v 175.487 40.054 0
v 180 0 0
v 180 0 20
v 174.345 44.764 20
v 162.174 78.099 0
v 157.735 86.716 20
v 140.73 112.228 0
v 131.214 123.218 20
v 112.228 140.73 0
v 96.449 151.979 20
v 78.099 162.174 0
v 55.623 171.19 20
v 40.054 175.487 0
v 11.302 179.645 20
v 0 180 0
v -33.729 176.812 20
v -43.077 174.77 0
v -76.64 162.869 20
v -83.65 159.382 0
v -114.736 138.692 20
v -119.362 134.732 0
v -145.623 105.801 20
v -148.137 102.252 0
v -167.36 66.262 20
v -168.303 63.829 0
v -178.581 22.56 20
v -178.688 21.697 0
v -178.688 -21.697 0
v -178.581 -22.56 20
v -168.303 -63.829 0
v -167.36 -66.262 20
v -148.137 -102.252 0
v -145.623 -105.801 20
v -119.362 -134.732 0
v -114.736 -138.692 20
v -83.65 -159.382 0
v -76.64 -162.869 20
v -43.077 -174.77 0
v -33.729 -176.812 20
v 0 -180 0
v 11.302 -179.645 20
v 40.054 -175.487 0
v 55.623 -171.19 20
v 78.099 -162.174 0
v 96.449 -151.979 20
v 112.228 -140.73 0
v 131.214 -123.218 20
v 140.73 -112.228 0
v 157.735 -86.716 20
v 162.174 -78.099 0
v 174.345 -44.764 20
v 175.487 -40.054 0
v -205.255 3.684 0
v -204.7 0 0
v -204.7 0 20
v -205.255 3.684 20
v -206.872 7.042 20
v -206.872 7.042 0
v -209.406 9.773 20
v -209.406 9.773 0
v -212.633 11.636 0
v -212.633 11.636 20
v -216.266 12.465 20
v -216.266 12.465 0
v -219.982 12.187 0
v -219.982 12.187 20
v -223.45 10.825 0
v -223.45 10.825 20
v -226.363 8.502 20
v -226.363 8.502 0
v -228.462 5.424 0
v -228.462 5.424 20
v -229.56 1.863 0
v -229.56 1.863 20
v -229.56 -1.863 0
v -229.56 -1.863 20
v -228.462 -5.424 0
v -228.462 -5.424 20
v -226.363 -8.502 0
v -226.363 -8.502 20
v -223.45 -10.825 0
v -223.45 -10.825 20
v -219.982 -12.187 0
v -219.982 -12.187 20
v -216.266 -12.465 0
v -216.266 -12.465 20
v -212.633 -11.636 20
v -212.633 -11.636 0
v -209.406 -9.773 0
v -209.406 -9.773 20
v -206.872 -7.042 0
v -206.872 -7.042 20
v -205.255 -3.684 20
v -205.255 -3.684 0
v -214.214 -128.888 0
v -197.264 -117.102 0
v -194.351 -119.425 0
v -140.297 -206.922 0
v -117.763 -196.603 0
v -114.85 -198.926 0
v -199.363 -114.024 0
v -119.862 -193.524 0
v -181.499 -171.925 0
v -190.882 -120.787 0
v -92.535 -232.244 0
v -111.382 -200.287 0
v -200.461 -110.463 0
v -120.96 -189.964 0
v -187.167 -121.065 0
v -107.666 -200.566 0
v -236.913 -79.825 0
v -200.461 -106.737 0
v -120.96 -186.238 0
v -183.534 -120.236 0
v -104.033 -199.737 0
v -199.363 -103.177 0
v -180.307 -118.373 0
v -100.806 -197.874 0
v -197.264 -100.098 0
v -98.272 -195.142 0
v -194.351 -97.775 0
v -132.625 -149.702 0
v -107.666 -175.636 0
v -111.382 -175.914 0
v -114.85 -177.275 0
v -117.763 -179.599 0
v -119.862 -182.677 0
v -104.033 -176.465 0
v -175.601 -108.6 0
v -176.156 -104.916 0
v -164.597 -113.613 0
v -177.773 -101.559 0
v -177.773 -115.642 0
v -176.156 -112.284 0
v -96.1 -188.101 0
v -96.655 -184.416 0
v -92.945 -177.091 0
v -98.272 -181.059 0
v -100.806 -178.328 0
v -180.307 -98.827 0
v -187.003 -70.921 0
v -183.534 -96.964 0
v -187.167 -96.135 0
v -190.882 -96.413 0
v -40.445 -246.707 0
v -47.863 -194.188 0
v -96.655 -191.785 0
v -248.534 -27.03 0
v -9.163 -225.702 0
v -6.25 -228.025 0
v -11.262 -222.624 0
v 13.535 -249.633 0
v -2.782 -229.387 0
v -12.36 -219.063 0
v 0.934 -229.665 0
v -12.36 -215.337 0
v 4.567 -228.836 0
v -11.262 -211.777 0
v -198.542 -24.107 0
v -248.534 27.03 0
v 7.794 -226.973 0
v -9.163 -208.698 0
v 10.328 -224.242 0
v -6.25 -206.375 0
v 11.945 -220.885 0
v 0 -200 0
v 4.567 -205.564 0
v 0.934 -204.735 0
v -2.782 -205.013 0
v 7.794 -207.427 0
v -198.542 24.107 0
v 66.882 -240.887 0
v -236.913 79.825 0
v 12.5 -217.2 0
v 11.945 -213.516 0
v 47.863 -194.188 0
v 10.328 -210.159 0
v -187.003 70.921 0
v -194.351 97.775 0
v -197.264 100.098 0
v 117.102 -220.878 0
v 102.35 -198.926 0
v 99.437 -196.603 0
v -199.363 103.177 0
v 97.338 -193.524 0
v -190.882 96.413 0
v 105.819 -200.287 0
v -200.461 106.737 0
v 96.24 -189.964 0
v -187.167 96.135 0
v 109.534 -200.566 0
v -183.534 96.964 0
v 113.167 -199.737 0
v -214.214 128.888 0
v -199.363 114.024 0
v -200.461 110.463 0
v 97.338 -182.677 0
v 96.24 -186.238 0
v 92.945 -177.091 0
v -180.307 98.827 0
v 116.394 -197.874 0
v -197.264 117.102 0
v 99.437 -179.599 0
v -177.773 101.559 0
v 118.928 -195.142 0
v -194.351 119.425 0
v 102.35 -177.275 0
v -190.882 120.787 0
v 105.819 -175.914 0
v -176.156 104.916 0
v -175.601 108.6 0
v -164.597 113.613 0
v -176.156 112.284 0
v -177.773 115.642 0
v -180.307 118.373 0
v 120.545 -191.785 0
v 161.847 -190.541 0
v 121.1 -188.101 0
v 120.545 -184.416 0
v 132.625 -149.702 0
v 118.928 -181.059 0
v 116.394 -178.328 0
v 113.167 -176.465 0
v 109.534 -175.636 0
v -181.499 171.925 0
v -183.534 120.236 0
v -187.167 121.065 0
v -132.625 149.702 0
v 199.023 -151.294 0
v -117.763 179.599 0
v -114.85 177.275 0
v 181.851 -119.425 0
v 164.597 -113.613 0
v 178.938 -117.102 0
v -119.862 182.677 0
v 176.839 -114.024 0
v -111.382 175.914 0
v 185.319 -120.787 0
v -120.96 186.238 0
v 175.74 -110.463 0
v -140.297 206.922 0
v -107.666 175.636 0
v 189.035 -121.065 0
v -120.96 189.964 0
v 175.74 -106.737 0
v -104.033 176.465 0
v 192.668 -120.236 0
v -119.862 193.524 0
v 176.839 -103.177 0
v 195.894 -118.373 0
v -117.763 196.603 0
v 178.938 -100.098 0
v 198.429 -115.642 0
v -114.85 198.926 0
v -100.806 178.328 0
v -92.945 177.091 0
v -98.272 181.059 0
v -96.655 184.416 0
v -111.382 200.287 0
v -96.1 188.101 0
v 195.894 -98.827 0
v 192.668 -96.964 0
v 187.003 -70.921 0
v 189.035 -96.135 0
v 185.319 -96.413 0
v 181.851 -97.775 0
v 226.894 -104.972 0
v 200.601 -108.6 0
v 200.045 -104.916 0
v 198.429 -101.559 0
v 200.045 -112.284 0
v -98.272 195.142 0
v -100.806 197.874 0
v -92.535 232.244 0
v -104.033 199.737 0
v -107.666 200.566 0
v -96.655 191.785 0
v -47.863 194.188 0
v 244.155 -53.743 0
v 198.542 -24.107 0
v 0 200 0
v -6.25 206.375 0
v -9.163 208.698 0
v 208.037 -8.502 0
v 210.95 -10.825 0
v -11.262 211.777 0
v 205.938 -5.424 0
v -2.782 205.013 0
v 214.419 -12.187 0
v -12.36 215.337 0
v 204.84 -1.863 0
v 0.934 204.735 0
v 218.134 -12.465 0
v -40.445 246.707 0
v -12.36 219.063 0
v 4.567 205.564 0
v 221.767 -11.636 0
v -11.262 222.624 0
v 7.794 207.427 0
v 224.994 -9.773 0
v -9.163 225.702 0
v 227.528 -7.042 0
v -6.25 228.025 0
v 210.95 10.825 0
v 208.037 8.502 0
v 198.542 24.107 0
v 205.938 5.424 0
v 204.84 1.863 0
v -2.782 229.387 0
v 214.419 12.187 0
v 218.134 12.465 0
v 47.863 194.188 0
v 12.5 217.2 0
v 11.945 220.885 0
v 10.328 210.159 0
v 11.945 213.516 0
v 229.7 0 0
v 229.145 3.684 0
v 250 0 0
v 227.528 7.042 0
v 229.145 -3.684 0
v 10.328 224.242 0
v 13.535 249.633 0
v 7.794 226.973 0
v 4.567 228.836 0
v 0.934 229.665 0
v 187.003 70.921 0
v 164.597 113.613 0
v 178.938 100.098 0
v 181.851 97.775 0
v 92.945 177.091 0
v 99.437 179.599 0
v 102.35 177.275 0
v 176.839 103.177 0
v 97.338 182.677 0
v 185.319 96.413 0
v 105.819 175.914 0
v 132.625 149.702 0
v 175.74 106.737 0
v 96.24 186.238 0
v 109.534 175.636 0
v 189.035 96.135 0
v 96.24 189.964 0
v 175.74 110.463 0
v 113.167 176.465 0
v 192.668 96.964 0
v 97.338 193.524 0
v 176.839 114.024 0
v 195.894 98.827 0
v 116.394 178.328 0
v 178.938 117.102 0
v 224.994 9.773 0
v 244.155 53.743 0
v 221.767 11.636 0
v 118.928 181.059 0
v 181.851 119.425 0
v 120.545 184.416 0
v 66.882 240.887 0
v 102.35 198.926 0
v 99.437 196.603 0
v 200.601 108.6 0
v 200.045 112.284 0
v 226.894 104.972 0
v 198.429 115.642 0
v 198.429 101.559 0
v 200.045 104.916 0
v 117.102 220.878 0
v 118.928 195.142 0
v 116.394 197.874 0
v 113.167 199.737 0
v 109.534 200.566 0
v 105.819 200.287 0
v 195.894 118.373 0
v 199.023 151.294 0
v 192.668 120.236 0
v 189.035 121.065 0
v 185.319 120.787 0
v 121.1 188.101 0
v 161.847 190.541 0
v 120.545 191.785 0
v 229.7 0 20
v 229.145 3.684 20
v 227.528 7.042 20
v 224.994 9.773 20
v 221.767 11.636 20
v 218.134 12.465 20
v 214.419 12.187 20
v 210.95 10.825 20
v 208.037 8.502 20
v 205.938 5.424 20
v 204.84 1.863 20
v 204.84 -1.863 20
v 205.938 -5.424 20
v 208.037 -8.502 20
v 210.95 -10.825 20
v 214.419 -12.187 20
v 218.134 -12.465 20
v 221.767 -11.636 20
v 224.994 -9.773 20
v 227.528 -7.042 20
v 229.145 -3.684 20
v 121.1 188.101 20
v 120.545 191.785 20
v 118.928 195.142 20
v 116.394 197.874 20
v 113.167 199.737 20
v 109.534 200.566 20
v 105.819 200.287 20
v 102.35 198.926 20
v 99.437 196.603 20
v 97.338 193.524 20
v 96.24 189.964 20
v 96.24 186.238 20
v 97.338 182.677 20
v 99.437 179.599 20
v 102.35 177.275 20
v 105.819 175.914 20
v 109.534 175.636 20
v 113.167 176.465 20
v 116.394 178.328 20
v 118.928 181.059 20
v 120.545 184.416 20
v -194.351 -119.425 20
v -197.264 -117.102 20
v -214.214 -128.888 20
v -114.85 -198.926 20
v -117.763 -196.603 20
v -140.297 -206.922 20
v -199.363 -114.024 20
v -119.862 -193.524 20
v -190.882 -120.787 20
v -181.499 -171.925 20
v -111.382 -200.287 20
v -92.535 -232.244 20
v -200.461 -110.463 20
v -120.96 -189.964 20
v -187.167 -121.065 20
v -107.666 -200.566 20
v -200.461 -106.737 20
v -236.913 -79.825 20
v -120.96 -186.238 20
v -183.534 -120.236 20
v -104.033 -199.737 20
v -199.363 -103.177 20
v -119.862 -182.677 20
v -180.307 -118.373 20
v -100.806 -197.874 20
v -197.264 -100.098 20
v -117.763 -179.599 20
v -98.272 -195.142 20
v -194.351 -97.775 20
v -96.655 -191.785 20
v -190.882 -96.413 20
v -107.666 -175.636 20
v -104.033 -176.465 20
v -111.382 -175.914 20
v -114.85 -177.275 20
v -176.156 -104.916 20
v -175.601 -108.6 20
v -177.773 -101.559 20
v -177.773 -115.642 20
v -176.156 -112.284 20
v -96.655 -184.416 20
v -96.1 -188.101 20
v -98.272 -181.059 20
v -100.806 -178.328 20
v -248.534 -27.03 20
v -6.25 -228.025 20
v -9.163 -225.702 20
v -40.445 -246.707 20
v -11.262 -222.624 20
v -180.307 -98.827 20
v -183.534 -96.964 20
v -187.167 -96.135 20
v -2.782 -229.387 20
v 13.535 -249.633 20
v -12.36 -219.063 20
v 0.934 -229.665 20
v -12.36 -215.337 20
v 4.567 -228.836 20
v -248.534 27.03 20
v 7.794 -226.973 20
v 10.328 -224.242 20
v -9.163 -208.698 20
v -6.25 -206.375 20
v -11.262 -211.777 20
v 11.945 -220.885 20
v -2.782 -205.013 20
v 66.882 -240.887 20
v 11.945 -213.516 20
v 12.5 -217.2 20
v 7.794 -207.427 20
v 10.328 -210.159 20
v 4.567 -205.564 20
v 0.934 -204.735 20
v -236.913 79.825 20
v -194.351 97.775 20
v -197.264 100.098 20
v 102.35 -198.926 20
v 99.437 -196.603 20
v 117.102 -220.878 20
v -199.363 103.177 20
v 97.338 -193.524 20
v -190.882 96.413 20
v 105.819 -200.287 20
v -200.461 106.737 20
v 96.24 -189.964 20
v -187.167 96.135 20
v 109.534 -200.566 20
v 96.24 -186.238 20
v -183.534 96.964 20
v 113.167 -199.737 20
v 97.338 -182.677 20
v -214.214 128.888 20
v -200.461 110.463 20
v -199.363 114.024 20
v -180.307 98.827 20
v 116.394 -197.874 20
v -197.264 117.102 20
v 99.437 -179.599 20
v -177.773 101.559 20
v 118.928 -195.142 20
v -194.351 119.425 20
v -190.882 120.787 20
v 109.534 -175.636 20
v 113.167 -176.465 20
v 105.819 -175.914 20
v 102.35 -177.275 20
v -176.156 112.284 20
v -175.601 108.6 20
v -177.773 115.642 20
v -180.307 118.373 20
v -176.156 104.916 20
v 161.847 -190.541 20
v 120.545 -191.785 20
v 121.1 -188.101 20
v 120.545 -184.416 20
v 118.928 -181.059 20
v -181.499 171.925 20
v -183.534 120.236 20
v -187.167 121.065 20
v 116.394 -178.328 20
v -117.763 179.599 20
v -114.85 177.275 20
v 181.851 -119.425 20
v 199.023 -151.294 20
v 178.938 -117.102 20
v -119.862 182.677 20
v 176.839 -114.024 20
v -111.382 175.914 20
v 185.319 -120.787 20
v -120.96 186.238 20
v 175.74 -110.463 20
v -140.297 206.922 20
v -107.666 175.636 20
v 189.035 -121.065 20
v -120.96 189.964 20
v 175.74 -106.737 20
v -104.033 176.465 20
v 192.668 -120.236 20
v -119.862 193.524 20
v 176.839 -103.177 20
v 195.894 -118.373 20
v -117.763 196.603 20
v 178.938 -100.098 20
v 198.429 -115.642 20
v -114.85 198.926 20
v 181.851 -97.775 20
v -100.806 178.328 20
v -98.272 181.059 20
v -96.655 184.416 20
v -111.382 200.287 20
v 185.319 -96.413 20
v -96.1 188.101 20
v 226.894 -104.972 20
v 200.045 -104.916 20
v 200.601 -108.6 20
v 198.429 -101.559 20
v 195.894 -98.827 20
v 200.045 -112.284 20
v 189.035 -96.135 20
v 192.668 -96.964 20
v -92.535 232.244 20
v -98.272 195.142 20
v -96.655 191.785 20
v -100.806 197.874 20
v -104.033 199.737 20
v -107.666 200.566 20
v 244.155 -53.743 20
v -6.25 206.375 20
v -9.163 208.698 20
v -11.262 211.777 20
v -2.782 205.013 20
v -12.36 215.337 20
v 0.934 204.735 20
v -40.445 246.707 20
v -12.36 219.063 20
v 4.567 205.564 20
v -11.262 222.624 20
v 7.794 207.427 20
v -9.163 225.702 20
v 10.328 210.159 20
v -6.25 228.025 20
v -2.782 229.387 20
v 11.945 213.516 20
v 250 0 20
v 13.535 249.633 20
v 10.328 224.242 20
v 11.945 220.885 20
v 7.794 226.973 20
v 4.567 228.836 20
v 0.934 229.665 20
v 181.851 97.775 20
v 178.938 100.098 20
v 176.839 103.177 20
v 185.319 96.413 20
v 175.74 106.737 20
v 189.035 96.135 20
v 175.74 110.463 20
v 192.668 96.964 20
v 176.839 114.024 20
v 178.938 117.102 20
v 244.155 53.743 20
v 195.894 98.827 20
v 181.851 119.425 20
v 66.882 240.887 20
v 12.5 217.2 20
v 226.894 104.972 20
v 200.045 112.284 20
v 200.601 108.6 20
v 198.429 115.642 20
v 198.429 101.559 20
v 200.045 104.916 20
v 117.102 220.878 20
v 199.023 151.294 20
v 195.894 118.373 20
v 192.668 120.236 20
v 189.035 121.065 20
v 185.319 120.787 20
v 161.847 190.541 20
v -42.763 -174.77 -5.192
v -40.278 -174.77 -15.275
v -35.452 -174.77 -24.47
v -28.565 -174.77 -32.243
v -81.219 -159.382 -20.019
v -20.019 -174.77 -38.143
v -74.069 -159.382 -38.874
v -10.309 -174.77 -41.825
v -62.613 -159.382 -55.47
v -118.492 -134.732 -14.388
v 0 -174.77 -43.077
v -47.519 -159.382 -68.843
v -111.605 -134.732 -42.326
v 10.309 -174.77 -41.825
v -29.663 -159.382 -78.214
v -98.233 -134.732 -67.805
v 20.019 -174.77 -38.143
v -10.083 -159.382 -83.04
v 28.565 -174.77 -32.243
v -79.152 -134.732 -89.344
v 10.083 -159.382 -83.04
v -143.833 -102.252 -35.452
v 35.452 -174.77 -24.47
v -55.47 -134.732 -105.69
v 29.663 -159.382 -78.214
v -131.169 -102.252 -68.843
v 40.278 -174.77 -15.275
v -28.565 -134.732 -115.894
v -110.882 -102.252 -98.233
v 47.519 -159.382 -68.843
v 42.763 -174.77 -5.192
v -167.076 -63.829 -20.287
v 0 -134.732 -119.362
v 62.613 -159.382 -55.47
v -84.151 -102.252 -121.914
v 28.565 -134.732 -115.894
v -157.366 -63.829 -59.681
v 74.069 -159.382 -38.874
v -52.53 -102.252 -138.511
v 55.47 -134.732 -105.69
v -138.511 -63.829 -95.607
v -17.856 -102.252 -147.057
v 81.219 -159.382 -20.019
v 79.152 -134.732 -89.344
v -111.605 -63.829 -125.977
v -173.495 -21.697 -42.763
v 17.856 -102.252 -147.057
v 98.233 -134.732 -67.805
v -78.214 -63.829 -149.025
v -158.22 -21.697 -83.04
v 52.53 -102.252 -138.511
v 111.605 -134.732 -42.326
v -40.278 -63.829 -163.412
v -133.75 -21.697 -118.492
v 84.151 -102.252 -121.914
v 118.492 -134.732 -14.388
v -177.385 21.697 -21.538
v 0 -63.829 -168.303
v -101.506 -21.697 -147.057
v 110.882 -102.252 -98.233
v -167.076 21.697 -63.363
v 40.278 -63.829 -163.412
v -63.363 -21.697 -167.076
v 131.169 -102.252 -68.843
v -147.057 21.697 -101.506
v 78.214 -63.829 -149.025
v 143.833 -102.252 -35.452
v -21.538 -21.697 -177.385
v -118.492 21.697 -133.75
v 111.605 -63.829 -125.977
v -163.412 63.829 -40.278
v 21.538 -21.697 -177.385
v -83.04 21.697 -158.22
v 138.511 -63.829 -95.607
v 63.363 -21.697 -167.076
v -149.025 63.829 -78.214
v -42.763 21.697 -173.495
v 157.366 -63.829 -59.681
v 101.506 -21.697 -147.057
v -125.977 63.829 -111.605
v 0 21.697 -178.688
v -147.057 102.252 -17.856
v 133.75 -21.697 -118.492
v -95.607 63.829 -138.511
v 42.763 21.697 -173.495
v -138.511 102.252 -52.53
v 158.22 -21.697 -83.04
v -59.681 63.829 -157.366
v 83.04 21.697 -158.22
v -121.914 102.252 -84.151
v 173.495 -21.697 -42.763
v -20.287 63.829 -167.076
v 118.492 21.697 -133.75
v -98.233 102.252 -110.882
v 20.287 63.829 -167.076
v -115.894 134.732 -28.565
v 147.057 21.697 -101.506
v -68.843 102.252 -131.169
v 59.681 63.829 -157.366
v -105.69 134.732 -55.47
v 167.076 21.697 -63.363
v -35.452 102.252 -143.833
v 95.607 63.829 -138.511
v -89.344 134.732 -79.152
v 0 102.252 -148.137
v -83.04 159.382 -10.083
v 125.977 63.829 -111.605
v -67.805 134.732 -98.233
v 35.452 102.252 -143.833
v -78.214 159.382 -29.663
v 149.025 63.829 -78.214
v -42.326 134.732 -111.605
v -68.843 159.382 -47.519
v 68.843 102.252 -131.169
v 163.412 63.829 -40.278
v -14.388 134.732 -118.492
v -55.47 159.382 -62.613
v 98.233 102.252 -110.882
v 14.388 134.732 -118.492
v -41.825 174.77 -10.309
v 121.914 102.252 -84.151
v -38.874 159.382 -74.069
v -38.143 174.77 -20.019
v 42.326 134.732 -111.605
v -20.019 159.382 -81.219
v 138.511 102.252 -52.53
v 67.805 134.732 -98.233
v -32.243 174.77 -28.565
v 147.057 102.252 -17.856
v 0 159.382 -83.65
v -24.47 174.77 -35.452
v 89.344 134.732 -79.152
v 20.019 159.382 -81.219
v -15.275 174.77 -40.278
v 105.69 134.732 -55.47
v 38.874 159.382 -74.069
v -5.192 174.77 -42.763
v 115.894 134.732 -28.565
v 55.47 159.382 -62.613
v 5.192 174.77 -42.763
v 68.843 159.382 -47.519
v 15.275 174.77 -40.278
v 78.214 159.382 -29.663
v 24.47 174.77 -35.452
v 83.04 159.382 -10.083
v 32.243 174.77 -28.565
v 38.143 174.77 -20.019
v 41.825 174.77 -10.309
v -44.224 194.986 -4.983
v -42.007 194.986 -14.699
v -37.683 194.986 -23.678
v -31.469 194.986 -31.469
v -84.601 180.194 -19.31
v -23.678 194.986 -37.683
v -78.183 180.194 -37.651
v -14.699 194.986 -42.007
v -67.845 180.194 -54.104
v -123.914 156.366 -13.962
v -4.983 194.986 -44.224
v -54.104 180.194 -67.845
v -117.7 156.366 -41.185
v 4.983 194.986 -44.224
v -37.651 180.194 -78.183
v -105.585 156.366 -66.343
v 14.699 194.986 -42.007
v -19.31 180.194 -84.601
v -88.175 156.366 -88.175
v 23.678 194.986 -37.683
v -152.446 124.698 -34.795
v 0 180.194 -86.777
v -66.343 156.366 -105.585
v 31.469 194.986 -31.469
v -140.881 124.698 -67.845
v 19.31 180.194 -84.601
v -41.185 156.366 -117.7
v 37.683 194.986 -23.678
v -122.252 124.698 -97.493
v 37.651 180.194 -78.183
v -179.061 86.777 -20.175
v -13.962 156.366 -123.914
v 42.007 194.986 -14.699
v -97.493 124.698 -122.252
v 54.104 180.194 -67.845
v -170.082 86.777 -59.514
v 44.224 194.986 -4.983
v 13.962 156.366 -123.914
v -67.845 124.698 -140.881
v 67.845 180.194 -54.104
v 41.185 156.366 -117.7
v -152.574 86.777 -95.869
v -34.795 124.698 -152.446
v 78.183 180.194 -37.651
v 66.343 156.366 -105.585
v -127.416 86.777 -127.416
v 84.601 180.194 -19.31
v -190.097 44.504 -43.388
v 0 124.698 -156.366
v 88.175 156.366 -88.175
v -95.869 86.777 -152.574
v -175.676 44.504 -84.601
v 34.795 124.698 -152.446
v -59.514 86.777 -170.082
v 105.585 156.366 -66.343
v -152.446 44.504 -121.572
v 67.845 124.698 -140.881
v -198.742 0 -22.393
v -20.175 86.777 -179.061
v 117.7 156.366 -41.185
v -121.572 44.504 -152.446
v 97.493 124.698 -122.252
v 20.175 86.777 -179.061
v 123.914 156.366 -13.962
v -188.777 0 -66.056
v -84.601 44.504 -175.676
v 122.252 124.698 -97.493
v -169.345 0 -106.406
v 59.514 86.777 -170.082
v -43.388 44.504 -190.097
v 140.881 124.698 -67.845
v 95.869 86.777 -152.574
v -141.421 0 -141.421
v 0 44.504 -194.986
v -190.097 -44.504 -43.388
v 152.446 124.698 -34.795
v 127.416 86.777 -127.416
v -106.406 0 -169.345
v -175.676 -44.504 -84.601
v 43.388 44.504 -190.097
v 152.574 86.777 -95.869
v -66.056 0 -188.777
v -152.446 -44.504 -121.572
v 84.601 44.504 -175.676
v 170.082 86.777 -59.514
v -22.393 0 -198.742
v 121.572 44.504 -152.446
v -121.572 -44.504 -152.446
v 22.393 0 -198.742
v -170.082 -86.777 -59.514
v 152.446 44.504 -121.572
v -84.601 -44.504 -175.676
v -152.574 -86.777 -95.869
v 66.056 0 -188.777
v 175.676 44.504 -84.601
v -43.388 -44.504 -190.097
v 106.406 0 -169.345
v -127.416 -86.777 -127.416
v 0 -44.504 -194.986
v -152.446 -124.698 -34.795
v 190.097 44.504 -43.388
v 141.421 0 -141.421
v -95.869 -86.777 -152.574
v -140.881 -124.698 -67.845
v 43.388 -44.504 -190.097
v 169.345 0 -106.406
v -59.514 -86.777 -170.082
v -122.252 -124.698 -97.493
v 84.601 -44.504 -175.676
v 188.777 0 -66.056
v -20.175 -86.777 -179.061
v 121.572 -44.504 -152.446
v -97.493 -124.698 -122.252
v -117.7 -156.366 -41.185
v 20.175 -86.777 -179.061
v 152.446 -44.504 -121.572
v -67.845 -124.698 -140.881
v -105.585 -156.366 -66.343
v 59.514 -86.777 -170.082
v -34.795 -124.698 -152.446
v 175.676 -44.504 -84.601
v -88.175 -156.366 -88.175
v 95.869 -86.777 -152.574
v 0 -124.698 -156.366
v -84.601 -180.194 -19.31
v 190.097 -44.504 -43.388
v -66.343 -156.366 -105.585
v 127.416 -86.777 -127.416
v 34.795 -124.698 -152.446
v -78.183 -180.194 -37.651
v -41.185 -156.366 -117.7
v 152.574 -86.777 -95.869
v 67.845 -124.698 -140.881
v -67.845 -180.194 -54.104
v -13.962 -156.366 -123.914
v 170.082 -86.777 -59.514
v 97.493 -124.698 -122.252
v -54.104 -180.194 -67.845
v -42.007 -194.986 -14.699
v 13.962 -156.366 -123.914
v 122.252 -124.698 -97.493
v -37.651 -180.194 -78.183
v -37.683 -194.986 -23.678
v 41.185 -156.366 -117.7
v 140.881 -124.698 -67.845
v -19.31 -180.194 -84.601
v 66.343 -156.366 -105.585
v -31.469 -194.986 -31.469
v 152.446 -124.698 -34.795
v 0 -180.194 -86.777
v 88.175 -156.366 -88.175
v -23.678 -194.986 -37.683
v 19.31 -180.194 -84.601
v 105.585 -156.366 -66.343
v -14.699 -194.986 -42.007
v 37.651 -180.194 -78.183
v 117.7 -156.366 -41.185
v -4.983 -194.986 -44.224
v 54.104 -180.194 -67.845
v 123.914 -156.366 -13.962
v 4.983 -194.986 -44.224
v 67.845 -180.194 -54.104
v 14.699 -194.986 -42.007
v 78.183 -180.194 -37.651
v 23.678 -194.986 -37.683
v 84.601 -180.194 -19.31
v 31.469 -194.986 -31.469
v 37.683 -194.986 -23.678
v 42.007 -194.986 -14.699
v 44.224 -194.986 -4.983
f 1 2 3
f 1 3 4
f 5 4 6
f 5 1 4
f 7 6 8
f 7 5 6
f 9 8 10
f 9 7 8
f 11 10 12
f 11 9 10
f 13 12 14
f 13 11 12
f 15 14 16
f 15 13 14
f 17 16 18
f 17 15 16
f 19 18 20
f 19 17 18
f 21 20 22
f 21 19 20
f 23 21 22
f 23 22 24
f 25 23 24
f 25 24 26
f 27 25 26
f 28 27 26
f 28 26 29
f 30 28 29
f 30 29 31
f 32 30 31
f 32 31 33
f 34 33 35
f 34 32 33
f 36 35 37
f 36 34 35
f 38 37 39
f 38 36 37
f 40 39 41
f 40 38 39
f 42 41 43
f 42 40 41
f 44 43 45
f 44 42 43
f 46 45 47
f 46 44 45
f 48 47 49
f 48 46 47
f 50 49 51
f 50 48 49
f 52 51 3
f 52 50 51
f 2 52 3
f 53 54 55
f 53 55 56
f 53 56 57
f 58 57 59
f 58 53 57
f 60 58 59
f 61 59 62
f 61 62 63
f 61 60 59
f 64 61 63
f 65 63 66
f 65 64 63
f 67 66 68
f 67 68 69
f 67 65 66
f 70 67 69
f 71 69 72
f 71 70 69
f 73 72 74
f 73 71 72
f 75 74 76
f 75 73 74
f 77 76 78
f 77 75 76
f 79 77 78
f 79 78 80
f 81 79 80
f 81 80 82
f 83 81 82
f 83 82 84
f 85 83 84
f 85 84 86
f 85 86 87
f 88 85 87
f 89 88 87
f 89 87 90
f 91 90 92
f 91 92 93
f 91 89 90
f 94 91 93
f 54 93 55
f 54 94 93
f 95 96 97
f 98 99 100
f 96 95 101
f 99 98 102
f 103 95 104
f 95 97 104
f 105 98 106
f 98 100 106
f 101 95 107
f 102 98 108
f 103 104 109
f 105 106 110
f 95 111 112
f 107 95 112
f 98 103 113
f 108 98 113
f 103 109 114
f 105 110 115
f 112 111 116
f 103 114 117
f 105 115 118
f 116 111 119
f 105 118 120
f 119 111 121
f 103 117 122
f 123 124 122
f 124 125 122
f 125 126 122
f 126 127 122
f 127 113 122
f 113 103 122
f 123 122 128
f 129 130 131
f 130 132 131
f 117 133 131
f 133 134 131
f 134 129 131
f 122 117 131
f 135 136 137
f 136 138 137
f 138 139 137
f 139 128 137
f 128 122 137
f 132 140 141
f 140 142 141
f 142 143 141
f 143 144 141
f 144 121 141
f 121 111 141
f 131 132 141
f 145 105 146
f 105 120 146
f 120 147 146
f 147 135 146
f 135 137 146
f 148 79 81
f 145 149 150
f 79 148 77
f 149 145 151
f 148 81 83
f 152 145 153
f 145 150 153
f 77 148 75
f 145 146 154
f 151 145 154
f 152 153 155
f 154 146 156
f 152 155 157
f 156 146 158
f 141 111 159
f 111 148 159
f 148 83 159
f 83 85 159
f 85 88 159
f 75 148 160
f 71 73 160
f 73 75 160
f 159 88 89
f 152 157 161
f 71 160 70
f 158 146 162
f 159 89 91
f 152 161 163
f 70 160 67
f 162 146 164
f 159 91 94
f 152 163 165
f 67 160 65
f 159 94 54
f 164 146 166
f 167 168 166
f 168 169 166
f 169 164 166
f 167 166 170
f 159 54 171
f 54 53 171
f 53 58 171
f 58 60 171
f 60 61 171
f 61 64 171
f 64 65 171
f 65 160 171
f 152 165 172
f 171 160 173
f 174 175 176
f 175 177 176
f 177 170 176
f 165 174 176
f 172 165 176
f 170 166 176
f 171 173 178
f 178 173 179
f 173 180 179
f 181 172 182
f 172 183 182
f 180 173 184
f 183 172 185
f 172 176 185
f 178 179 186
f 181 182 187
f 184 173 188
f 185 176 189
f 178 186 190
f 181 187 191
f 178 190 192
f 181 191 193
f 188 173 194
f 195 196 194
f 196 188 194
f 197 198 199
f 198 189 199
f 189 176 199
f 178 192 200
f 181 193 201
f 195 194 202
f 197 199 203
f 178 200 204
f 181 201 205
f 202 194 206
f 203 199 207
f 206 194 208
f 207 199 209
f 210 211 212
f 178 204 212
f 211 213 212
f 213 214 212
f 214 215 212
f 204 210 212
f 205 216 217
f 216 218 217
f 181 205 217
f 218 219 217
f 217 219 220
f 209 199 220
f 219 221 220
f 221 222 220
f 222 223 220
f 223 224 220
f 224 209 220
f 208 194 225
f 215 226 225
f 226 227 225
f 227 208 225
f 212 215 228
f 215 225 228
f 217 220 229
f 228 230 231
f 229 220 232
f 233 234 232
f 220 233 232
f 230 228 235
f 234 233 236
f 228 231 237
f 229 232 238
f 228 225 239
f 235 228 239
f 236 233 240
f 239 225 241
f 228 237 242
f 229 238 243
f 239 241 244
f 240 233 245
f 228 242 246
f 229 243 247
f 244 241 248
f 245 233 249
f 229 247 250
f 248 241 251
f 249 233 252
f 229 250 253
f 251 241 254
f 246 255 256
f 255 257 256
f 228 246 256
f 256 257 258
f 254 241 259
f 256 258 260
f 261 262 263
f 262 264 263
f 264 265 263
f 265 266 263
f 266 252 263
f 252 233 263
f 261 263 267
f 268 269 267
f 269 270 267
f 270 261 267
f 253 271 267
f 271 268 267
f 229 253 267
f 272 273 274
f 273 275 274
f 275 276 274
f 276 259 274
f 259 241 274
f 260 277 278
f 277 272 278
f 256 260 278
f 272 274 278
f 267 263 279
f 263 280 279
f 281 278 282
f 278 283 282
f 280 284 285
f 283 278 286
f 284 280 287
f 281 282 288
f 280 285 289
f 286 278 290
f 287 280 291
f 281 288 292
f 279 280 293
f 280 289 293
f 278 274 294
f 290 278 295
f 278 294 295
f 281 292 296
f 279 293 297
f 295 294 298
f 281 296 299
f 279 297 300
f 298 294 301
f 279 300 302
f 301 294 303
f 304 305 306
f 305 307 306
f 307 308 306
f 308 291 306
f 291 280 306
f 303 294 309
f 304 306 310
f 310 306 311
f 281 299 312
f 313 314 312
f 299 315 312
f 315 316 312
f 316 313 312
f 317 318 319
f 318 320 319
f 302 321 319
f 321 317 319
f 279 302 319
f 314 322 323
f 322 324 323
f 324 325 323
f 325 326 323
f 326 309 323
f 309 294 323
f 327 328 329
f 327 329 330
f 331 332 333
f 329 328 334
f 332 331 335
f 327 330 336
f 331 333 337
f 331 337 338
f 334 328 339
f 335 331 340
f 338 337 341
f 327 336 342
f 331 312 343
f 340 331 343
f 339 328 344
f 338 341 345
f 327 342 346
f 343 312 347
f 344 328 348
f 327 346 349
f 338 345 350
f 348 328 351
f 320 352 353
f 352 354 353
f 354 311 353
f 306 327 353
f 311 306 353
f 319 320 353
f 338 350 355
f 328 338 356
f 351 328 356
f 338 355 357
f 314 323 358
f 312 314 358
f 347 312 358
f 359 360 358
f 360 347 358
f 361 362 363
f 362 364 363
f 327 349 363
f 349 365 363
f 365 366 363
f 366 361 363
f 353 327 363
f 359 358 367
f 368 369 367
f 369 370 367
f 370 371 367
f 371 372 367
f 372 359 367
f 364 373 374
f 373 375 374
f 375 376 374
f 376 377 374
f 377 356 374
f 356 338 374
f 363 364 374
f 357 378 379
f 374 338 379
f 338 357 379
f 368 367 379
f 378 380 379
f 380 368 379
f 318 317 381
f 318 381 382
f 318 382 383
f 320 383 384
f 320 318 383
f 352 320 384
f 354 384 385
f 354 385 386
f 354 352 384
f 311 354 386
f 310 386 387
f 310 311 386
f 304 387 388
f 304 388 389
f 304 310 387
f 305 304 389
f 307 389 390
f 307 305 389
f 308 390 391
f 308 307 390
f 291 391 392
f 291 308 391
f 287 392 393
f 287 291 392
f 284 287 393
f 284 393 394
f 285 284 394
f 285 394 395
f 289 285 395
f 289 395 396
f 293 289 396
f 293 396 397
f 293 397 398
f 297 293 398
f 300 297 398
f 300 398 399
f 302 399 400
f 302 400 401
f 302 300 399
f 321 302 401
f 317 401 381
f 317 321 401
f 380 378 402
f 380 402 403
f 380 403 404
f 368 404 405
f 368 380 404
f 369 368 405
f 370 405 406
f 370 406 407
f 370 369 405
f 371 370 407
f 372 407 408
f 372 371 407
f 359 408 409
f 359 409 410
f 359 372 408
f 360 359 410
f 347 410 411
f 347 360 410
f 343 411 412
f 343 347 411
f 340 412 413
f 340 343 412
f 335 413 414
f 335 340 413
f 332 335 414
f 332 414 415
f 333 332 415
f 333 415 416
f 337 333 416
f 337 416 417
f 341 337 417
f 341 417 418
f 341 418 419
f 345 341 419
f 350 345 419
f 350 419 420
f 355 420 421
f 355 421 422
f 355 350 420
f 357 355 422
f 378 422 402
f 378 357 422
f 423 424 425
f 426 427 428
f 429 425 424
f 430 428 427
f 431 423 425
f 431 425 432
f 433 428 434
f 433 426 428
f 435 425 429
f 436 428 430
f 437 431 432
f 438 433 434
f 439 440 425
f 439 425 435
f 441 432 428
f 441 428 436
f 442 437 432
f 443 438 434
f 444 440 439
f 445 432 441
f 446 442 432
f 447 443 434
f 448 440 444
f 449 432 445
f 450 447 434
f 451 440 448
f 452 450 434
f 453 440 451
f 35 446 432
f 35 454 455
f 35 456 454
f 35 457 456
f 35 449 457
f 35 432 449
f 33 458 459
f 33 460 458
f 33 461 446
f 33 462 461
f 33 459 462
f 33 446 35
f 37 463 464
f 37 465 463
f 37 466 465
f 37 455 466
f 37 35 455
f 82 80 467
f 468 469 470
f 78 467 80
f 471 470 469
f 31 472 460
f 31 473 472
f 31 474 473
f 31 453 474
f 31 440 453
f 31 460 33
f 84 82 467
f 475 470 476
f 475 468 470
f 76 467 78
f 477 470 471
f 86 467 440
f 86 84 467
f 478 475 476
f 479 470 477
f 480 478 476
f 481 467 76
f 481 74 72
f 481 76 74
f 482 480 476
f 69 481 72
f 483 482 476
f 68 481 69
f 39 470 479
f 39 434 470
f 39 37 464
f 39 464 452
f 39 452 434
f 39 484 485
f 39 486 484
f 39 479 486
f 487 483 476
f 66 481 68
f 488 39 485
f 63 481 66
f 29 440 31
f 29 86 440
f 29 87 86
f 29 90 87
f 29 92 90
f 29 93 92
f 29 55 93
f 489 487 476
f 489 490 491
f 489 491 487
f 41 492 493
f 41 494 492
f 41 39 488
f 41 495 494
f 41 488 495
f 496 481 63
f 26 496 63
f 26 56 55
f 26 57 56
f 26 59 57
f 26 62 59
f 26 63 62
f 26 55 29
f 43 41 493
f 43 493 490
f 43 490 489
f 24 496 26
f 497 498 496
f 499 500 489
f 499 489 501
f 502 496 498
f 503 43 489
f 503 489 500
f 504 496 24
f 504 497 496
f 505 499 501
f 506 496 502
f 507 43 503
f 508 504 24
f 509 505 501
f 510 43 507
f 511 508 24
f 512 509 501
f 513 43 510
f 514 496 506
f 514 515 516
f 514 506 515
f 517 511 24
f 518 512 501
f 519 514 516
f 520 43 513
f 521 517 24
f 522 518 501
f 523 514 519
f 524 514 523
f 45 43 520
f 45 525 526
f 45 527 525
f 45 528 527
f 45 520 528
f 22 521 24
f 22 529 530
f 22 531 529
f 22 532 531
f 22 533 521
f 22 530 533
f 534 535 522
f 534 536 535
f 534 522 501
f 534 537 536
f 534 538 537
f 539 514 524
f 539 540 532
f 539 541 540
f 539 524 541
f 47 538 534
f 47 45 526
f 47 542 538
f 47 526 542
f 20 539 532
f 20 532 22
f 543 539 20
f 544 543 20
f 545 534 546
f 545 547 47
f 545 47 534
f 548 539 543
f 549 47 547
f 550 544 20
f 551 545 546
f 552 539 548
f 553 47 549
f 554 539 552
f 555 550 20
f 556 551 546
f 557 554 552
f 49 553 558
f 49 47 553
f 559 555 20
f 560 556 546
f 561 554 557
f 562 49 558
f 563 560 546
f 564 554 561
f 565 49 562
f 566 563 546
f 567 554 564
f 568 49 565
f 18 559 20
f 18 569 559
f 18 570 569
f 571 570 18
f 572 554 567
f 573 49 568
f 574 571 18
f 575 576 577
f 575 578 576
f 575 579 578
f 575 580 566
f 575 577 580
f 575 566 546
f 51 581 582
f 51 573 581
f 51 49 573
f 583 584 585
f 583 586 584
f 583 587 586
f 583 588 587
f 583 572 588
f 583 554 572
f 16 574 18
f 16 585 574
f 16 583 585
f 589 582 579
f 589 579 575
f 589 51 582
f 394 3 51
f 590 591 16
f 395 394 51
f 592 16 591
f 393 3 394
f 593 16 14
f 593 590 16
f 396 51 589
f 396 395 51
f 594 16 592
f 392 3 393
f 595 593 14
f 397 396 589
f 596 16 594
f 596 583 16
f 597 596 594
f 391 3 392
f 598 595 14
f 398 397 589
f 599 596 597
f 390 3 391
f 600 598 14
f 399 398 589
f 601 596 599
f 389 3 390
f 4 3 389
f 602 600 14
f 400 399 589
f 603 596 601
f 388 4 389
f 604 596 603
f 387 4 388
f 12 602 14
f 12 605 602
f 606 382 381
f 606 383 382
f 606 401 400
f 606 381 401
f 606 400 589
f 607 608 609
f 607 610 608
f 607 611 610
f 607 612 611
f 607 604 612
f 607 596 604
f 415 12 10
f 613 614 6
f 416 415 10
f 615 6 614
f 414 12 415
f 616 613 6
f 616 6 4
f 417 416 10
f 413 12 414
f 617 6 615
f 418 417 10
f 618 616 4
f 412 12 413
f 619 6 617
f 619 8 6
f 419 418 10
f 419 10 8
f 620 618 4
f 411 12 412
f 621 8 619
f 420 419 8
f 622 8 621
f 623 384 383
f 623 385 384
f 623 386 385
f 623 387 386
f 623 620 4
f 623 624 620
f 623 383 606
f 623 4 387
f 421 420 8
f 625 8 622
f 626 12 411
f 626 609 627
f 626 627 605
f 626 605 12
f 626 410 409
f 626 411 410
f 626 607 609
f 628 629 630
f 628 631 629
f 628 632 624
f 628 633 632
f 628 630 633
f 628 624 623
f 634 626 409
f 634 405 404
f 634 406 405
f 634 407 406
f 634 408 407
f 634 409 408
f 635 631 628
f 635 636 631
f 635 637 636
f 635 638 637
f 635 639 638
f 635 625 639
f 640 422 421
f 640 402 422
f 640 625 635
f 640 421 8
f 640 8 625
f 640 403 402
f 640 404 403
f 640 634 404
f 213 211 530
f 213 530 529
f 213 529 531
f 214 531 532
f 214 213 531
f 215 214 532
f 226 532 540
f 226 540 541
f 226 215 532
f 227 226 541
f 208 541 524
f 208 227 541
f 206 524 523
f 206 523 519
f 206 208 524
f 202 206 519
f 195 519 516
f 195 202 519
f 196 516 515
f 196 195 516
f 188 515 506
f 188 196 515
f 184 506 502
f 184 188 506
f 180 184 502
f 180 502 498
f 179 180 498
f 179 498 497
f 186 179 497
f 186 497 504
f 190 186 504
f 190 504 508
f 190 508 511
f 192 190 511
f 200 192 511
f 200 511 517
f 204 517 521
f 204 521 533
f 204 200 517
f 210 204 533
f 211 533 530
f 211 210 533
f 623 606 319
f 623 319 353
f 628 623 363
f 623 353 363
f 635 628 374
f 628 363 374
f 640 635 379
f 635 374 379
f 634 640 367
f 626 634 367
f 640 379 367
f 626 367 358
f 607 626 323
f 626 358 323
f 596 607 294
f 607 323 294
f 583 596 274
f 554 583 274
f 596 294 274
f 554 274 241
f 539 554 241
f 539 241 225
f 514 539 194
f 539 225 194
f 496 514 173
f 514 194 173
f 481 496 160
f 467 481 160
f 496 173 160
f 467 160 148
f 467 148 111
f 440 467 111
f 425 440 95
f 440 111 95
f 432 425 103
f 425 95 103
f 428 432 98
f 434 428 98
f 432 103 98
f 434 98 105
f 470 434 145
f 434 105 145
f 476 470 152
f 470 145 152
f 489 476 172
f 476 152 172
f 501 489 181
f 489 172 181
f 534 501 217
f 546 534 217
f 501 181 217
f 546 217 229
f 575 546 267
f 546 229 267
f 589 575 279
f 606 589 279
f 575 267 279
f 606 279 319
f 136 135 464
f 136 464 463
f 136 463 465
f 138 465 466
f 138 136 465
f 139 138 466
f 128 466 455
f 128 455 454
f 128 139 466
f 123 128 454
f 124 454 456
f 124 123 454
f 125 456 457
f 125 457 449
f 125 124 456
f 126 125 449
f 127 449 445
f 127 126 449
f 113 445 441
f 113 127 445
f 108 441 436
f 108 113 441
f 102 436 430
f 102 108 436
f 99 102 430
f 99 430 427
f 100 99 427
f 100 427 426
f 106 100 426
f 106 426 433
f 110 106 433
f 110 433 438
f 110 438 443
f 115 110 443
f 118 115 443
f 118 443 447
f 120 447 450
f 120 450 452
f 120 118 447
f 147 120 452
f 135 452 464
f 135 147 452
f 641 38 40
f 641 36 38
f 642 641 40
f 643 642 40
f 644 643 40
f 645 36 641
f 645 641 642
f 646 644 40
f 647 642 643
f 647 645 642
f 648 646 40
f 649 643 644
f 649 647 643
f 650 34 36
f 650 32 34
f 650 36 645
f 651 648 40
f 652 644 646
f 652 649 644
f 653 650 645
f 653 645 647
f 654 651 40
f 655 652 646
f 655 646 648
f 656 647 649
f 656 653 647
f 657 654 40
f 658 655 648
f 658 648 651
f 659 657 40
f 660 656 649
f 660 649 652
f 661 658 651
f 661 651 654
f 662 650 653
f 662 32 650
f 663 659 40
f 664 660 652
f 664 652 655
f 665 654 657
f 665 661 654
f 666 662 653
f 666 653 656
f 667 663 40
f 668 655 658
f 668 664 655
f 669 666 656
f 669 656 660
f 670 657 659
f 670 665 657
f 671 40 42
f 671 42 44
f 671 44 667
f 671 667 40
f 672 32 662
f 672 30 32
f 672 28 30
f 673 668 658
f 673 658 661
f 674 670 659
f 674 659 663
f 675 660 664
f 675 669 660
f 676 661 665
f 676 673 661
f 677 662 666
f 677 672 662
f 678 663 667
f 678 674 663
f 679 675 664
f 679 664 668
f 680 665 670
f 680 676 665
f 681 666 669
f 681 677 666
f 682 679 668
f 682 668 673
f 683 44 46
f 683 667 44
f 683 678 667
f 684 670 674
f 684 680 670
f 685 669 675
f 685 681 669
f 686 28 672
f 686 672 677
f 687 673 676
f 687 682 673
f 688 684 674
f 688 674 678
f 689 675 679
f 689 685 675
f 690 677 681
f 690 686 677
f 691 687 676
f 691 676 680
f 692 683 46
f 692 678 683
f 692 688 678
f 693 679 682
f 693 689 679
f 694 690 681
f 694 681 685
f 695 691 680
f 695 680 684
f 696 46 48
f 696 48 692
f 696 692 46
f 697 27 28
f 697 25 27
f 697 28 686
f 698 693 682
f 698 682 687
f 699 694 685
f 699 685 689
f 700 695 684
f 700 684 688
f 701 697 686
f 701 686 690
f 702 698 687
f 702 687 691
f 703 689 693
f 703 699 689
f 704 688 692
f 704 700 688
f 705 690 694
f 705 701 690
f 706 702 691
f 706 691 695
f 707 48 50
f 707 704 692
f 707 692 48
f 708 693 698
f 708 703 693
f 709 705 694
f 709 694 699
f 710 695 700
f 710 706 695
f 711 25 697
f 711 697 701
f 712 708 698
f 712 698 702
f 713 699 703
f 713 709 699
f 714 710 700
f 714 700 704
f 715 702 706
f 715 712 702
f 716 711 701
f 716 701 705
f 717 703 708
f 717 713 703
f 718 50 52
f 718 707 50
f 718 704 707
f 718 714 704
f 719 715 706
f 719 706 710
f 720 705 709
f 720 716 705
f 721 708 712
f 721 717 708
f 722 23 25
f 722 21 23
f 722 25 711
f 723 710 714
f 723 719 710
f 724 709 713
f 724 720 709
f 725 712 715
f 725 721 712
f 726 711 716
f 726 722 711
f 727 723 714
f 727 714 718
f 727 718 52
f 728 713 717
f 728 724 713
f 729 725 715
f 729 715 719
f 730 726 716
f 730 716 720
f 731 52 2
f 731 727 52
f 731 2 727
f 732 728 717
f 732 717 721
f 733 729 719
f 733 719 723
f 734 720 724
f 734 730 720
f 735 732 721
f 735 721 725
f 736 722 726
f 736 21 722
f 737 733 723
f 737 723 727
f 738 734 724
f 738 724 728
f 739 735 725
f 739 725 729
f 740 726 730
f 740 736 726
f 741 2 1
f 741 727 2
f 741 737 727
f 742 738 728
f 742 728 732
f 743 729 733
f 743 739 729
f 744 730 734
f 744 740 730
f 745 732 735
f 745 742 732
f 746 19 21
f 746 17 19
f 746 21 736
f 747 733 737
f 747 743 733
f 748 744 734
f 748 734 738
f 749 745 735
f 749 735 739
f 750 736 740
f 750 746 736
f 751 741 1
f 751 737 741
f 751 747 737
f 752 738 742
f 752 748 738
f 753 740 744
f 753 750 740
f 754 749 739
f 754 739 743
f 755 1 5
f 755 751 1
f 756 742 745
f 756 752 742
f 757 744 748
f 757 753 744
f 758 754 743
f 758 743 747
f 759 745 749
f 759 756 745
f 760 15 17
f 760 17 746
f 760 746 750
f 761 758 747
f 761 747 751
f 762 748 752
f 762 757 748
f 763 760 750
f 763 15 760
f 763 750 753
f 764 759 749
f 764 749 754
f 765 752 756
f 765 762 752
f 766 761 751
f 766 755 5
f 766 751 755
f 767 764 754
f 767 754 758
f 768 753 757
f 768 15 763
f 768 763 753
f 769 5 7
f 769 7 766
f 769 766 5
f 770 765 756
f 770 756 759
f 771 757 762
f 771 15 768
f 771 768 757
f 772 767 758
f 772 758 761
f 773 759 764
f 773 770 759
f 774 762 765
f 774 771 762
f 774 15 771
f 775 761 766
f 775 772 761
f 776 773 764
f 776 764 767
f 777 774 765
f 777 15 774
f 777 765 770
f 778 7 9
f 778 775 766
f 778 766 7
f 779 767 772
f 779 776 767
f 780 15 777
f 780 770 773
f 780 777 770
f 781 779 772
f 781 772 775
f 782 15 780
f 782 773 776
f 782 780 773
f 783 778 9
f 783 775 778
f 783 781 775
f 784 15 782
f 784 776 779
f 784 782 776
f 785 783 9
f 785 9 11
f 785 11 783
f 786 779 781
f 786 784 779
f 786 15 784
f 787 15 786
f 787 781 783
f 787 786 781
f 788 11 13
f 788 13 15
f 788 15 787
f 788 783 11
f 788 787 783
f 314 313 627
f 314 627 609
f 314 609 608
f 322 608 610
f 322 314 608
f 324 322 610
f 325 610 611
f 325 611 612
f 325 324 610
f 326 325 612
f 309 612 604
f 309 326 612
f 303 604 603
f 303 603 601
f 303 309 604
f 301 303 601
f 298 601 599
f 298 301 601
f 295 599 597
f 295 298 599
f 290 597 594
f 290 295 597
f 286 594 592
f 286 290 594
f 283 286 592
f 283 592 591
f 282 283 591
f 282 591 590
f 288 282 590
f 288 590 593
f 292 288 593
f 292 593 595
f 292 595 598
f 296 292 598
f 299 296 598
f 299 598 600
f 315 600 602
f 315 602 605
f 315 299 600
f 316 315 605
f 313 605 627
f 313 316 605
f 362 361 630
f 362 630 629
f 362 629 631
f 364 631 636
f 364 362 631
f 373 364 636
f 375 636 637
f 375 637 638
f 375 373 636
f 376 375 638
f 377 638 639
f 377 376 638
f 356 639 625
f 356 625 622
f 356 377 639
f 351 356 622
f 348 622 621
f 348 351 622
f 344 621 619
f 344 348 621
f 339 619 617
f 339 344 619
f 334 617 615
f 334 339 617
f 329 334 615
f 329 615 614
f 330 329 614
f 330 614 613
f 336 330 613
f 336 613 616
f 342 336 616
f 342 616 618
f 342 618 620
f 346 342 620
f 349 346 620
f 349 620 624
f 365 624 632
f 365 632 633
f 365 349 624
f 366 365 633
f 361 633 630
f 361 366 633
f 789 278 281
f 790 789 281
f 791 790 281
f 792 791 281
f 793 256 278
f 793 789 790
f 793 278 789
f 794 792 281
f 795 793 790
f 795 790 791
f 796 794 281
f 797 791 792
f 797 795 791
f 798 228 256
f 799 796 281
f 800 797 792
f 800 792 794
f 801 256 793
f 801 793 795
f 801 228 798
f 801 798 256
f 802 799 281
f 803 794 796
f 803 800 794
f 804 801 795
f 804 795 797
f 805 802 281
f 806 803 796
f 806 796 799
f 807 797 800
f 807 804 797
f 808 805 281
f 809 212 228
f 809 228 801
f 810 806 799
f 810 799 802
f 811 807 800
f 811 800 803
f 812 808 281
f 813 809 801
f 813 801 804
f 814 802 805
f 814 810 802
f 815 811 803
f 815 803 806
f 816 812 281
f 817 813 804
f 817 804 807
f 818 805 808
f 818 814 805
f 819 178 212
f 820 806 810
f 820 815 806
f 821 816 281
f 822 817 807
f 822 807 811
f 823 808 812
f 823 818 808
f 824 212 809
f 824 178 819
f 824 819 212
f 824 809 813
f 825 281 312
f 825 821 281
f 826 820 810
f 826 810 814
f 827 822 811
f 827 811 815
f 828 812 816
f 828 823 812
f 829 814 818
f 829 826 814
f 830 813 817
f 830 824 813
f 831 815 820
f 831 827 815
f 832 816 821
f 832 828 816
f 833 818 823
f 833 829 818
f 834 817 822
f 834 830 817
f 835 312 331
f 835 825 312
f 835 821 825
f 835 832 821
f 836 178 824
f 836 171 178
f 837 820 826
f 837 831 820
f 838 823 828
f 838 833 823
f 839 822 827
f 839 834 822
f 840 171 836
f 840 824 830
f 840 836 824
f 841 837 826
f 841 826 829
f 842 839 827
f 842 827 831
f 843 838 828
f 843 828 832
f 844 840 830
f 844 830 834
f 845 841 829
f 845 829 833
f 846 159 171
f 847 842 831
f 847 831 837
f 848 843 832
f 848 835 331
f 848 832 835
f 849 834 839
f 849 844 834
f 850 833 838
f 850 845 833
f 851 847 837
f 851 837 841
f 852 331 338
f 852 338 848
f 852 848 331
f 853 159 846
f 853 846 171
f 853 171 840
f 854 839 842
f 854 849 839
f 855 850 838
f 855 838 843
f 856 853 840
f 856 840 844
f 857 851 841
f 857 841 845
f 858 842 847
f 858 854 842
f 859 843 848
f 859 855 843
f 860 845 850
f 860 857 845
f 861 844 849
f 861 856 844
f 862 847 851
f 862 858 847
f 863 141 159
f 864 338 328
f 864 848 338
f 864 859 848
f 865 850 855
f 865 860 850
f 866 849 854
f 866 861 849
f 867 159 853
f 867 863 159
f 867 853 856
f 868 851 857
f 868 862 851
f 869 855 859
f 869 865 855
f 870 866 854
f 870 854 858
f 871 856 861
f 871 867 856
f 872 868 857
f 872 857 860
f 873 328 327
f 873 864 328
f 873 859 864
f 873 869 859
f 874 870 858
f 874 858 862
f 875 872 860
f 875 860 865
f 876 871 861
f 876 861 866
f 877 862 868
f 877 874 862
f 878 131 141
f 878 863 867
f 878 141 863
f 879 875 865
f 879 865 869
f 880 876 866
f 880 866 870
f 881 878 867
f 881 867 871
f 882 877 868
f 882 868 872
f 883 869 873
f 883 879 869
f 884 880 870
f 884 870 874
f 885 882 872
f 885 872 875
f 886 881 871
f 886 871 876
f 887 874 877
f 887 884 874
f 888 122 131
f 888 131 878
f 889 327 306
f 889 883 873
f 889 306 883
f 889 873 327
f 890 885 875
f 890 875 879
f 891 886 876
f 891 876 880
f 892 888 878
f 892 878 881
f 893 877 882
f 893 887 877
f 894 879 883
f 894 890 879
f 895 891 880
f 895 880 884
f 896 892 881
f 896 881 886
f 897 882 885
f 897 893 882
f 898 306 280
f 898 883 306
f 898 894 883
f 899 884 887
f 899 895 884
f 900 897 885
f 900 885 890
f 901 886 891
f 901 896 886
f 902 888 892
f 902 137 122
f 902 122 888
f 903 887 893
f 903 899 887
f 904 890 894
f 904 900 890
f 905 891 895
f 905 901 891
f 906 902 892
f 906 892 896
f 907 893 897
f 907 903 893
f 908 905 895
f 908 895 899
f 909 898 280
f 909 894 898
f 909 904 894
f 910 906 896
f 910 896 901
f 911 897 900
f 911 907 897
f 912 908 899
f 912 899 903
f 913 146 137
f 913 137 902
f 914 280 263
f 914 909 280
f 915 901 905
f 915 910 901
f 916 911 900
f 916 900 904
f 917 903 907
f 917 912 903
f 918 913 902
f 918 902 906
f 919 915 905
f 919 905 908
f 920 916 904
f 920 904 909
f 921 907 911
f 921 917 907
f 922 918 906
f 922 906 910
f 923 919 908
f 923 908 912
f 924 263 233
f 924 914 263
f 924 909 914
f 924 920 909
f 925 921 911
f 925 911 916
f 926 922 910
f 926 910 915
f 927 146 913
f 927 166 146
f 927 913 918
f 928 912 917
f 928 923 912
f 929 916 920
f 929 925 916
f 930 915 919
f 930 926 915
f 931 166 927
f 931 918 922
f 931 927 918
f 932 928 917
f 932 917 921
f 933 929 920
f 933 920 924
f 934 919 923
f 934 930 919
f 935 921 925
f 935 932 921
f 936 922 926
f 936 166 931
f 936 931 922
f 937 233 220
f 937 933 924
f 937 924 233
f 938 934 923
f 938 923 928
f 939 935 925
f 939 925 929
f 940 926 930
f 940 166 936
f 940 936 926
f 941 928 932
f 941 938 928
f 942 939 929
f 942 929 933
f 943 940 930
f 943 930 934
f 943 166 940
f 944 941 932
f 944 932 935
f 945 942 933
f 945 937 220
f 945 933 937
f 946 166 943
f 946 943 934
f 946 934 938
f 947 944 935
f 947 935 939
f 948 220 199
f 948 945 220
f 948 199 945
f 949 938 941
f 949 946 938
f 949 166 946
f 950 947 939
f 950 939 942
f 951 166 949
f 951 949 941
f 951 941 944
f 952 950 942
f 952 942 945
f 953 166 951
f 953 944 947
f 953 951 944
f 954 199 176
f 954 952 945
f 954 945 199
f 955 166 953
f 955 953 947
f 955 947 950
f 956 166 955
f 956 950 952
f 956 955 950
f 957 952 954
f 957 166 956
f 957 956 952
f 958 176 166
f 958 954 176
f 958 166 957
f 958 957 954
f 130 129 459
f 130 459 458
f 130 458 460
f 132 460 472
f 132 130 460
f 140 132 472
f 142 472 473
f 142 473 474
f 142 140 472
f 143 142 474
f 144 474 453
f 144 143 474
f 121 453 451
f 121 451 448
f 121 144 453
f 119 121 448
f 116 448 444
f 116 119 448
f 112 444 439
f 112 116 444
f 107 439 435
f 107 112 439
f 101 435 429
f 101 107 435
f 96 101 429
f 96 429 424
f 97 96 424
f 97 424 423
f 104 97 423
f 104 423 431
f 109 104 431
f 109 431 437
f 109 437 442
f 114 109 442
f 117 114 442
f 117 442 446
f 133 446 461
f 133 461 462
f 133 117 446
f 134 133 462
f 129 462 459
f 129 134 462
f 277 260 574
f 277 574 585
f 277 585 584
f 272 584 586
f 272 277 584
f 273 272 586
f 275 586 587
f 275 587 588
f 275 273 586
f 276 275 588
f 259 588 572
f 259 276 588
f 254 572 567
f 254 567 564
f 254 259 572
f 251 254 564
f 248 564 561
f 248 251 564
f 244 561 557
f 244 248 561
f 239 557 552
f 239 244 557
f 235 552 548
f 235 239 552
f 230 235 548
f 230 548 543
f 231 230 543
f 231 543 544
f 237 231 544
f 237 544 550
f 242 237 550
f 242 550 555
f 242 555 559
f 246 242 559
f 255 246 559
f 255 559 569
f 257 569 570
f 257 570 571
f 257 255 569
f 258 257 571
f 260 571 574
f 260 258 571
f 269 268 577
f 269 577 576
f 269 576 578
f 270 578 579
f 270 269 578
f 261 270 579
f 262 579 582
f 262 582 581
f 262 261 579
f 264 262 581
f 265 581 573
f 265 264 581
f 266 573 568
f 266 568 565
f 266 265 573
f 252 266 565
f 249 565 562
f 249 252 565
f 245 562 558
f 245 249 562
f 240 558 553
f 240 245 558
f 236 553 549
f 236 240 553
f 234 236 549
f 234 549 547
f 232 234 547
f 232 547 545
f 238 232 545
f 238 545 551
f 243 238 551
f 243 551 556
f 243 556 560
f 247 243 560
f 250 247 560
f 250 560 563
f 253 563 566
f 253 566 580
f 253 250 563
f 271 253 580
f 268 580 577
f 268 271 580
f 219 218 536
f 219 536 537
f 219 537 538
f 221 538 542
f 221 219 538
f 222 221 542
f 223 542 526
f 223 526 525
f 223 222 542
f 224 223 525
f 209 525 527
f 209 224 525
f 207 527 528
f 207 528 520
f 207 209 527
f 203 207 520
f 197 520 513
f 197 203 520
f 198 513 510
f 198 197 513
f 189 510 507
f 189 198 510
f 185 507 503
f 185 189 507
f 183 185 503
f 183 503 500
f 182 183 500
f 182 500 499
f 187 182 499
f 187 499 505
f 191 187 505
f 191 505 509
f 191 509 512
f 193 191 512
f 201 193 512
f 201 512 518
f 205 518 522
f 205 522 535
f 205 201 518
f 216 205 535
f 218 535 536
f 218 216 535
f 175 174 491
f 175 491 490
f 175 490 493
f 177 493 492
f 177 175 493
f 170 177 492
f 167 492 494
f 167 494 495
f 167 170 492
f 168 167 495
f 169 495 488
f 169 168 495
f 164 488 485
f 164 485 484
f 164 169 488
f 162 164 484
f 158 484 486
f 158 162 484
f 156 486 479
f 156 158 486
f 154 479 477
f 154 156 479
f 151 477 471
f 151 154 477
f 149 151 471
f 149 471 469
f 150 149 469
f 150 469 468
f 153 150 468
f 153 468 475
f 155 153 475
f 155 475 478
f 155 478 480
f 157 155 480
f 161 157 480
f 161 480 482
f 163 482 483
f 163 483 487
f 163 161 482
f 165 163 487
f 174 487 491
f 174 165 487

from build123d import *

# Parameters (mm, degrees)
SKETCH1_R           = 250
SKETCH1_R_2         = 180
SKETCH1_R_3         = 12.5
BOSS_EXTRUDE2_DEPTH = 20
REVOLVE1_ANGLE      = 180


with BuildPart() as part:
    # Sketch1 → Boss-Extrude2 (new body)
    with BuildSketch(Plane.XY):
        Circle(SKETCH1_R)
        Circle(SKETCH1_R_2, mode=Mode.SUBTRACT)
        with Locations((0, 217.200097765)):
            Circle(SKETCH1_R_3, mode=Mode.SUBTRACT)
        with Locations((108.600048882, 188.100802369)):
            Circle(SKETCH1_R_3, mode=Mode.SUBTRACT)
        with Locations((188.100802369, 108.600048882)):
            Circle(SKETCH1_R_3, mode=Mode.SUBTRACT)
        with Locations((217.200097765, 0)):
            Circle(SKETCH1_R_3, mode=Mode.SUBTRACT)
        with Locations((188.100802369, -108.600048882)):
            Circle(SKETCH1_R_3, mode=Mode.SUBTRACT)
        with Locations((108.600048882, -188.100802369)):
            Circle(SKETCH1_R_3, mode=Mode.SUBTRACT)
        with Locations((0, -217.200097765)):
            Circle(SKETCH1_R_3, mode=Mode.SUBTRACT)
        with Locations((-108.600048882, -188.100802369)):
            Circle(SKETCH1_R_3, mode=Mode.SUBTRACT)
        with Locations((-188.100802369, -108.600048882)):
            Circle(SKETCH1_R_3, mode=Mode.SUBTRACT)
        with Locations((-217.200097765, 0)):
            Circle(SKETCH1_R_3, mode=Mode.SUBTRACT)
        with Locations((-188.100802369, 108.600048882)):
            Circle(SKETCH1_R_3, mode=Mode.SUBTRACT)
        with Locations((-108.600048882, 188.100802369)):
            Circle(SKETCH1_R_3, mode=Mode.SUBTRACT)
    extrude(amount=BOSS_EXTRUDE2_DEPTH)

    # Sketch2 → Revolve1 (revolve)
    with BuildSketch(Plane(origin=(0, 0, 0), x_dir=(-1, 0, 0), z_dir=(0, 0, -1))):
        with BuildLine():
            Line((0, 180), (0, 200))
            ThreePointArc((0, 200), (200, 0), (0, -200))
            Line((0, -200), (0, -180))
            ThreePointArc((0, -180), (180, 0), (0, 180))
        make_face()
    revolve(axis=Axis((0, 180, 0), (0, -1, 0)), revolution_arc=REVOLVE1_ANGLE)


solid = part.part
